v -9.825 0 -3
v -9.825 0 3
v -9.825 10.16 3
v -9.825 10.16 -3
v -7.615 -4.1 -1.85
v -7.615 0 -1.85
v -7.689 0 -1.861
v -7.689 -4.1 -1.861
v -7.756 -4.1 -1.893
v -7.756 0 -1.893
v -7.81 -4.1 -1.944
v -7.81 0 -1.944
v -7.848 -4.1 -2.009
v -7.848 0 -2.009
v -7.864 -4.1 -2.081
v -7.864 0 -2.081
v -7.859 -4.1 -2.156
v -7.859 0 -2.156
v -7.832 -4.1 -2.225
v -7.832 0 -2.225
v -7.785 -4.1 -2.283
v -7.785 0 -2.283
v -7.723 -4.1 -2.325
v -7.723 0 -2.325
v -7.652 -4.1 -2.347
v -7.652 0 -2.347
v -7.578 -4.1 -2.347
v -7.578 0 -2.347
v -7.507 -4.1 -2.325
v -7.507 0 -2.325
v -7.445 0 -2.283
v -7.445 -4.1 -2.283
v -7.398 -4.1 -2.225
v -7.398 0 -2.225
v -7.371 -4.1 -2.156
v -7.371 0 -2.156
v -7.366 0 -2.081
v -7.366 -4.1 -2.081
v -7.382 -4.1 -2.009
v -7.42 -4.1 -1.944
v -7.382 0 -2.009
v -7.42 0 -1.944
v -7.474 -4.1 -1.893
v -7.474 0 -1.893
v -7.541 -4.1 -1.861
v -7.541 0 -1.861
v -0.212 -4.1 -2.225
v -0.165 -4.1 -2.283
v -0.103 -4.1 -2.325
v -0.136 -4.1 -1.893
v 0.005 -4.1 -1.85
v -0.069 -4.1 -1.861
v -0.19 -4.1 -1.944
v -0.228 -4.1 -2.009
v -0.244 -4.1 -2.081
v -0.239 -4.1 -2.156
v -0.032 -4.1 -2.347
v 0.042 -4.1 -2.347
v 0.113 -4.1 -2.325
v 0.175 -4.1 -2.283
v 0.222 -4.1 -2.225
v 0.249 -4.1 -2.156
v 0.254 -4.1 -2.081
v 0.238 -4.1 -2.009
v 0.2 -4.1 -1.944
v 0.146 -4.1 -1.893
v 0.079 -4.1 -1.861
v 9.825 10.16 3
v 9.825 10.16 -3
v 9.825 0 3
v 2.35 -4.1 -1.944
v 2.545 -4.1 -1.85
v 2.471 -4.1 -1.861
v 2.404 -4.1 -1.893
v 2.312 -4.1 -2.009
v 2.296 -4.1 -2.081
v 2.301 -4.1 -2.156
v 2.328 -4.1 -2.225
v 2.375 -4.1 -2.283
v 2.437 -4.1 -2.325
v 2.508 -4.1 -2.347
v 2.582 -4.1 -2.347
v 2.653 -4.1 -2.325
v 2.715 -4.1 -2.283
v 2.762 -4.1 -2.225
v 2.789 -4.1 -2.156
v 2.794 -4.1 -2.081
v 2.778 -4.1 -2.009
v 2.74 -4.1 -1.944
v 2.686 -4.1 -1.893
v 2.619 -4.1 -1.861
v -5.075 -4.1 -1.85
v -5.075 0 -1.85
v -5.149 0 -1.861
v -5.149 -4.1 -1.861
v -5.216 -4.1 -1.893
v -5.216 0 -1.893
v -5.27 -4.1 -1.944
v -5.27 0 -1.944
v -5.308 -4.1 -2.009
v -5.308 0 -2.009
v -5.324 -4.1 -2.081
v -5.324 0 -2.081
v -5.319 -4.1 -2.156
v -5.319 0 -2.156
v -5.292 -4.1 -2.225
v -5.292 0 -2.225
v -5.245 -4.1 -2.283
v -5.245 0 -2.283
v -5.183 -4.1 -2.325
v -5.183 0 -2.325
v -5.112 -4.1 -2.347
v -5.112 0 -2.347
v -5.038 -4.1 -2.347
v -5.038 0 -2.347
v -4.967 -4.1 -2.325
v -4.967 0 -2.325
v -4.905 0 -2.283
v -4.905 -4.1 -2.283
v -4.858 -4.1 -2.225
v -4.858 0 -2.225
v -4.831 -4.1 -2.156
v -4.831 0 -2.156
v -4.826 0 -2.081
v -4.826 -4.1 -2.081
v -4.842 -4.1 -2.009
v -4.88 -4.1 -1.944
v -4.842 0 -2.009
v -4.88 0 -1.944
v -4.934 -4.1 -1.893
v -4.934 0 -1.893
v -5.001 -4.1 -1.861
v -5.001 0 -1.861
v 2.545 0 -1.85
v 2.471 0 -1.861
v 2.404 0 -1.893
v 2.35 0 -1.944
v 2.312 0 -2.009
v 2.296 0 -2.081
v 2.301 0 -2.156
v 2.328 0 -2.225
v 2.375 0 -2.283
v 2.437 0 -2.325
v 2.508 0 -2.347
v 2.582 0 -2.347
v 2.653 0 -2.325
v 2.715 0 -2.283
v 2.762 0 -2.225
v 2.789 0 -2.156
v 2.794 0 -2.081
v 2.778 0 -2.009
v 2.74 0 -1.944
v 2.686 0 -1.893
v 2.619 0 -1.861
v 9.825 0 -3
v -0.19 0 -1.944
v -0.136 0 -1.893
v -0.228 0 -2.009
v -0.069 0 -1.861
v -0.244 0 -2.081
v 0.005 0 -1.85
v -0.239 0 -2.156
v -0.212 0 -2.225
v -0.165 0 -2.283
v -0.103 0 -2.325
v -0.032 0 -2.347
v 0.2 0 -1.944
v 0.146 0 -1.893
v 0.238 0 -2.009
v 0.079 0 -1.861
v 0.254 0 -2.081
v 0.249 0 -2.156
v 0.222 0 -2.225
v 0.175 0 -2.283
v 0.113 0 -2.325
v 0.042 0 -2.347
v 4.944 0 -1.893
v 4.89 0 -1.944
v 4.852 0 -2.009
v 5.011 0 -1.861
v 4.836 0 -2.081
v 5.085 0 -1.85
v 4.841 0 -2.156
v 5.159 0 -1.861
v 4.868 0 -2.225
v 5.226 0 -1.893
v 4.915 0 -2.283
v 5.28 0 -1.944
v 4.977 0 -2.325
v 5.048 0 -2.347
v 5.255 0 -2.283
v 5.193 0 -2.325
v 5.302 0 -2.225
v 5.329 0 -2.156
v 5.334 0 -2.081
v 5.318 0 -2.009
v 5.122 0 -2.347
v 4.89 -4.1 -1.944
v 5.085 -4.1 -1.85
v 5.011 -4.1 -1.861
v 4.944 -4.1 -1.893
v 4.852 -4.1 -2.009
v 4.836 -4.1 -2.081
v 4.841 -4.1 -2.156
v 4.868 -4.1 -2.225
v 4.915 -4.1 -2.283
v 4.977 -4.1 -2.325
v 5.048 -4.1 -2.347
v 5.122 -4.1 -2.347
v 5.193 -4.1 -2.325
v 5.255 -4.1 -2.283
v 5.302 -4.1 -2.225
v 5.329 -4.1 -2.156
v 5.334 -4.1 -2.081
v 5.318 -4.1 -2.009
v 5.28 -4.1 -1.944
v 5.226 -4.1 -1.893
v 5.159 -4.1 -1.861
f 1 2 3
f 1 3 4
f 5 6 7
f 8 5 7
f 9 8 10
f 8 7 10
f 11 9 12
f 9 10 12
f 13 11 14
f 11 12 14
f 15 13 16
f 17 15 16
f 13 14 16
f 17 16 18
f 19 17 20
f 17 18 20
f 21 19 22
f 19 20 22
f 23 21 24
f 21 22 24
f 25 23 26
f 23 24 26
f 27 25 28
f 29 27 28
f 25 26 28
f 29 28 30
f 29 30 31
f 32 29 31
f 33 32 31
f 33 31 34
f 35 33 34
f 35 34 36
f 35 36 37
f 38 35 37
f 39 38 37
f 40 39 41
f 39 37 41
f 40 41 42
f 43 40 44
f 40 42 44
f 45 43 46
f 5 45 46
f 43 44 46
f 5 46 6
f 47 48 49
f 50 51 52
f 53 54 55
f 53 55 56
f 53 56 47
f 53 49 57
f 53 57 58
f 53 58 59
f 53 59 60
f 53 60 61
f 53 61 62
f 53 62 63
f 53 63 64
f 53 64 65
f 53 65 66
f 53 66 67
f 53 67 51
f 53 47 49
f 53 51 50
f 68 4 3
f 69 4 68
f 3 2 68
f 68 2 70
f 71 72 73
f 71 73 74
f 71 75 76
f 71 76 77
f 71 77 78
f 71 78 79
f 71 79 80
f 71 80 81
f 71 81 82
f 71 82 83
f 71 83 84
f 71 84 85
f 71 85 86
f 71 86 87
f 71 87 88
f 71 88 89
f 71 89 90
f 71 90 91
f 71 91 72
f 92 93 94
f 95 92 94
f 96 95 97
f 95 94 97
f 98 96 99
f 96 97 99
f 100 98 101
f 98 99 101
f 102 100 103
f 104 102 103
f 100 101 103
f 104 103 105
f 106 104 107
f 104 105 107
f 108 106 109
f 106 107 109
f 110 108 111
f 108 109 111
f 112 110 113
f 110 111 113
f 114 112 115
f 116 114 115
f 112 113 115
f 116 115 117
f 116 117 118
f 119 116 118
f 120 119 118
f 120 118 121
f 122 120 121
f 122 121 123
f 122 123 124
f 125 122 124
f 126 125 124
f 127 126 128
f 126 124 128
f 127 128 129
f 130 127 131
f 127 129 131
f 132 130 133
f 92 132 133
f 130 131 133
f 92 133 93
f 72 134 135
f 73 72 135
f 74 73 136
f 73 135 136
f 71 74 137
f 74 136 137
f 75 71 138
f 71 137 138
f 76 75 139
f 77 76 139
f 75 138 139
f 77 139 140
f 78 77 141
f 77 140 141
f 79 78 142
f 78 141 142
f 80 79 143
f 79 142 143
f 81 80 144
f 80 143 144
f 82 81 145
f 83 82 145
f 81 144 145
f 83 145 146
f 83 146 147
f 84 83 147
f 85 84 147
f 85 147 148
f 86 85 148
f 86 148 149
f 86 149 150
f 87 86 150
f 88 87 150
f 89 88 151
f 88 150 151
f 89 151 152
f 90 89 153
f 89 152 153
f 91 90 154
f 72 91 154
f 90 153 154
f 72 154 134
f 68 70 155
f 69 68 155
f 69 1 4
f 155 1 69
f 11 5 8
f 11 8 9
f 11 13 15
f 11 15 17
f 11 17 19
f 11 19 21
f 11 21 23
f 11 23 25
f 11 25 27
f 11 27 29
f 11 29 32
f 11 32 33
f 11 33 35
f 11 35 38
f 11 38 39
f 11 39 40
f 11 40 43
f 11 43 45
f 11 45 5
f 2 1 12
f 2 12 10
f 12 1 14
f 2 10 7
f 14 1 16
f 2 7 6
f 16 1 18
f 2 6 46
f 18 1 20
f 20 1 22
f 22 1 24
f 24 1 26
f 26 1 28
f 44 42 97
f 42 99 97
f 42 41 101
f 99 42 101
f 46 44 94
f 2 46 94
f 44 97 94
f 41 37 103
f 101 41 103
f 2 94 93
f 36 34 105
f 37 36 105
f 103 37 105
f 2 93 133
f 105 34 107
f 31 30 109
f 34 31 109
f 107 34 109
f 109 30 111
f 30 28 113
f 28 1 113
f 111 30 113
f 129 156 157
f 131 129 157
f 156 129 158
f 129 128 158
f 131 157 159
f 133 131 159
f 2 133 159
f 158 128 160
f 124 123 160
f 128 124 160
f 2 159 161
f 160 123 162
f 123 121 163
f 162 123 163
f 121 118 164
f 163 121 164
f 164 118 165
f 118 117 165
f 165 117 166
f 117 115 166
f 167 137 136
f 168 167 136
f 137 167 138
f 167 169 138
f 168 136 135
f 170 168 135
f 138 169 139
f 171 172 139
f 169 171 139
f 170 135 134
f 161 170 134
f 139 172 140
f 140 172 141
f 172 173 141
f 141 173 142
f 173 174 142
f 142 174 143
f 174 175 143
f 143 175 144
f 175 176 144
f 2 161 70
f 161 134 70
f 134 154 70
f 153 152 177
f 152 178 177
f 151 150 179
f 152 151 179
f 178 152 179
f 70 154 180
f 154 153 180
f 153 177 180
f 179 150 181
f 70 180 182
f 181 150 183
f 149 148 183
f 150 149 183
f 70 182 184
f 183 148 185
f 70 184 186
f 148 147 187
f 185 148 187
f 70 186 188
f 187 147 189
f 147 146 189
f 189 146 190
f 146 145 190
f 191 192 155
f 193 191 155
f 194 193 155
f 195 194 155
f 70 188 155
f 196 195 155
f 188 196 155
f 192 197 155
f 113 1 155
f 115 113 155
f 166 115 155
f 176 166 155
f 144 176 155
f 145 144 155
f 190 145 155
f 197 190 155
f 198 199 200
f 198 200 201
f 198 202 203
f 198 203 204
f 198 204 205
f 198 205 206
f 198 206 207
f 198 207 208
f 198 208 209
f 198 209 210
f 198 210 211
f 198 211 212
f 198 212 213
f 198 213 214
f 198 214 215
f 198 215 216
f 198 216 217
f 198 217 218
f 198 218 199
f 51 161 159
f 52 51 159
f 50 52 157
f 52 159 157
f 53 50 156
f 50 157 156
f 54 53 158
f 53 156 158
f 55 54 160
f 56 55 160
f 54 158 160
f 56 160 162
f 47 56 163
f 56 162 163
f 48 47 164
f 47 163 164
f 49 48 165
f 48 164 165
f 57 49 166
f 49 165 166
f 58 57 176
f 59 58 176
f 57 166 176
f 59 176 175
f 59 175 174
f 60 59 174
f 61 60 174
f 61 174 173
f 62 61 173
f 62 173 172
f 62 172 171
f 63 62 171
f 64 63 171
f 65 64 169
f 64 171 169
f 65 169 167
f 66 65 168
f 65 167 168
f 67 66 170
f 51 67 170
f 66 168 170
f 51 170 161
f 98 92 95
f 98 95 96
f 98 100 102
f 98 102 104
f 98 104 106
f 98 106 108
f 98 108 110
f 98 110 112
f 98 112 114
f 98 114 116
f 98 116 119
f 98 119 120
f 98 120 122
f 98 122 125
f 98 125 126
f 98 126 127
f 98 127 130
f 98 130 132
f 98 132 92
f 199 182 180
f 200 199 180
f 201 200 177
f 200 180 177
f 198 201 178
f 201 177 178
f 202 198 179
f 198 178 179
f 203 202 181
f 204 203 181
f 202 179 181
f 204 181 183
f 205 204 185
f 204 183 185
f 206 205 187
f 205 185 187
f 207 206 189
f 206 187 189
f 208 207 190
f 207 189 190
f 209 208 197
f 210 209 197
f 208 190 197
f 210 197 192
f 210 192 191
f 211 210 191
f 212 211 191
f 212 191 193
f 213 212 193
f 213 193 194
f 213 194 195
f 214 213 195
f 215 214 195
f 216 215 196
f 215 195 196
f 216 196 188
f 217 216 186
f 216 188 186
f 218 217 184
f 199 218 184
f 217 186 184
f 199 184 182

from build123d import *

# Parameters (mm, degrees)
SKETCH1_W           = 19.65
SKETCH1_H           = 6
BOSS_EXTRUDE1_DEPTH = 10.16
SKETCH2_R           = 0.25
BOSS_EXTRUDE2_DEPTH = 4.1


with BuildPart() as part:
    # Sketch1 → Boss-Extrude1 (new body)
    with BuildSketch(Plane(origin=(0, 0, 0), x_dir=(1, 0, 0), z_dir=(0, 1, 0))):
        Rectangle(SKETCH1_W, SKETCH1_H)
    extrude(amount=BOSS_EXTRUDE1_DEPTH)

    # Sketch2 → Boss-Extrude2 (add)
    with BuildSketch(Plane.XZ):
        with Locations(Location((0.005, -2.1, 0), (0, 0, 90))):
            Circle(SKETCH2_R)
        with Locations(Location((2.545, -2.1, 0), (0, 0, 90))):
            Circle(SKETCH2_R)
        with Locations(Location((5.085, -2.1, 0), (0, 0, 90))):
            Circle(SKETCH2_R)
        with Locations(Location((-5.075, -2.1, 0), (0, 0, 90))):
            Circle(SKETCH2_R)
        with Locations(Location((-7.615, -2.1, 0), (0, 0, 90))):
            Circle(SKETCH2_R)
    extrude(amount=BOSS_EXTRUDE2_DEPTH)


solid = part.part
